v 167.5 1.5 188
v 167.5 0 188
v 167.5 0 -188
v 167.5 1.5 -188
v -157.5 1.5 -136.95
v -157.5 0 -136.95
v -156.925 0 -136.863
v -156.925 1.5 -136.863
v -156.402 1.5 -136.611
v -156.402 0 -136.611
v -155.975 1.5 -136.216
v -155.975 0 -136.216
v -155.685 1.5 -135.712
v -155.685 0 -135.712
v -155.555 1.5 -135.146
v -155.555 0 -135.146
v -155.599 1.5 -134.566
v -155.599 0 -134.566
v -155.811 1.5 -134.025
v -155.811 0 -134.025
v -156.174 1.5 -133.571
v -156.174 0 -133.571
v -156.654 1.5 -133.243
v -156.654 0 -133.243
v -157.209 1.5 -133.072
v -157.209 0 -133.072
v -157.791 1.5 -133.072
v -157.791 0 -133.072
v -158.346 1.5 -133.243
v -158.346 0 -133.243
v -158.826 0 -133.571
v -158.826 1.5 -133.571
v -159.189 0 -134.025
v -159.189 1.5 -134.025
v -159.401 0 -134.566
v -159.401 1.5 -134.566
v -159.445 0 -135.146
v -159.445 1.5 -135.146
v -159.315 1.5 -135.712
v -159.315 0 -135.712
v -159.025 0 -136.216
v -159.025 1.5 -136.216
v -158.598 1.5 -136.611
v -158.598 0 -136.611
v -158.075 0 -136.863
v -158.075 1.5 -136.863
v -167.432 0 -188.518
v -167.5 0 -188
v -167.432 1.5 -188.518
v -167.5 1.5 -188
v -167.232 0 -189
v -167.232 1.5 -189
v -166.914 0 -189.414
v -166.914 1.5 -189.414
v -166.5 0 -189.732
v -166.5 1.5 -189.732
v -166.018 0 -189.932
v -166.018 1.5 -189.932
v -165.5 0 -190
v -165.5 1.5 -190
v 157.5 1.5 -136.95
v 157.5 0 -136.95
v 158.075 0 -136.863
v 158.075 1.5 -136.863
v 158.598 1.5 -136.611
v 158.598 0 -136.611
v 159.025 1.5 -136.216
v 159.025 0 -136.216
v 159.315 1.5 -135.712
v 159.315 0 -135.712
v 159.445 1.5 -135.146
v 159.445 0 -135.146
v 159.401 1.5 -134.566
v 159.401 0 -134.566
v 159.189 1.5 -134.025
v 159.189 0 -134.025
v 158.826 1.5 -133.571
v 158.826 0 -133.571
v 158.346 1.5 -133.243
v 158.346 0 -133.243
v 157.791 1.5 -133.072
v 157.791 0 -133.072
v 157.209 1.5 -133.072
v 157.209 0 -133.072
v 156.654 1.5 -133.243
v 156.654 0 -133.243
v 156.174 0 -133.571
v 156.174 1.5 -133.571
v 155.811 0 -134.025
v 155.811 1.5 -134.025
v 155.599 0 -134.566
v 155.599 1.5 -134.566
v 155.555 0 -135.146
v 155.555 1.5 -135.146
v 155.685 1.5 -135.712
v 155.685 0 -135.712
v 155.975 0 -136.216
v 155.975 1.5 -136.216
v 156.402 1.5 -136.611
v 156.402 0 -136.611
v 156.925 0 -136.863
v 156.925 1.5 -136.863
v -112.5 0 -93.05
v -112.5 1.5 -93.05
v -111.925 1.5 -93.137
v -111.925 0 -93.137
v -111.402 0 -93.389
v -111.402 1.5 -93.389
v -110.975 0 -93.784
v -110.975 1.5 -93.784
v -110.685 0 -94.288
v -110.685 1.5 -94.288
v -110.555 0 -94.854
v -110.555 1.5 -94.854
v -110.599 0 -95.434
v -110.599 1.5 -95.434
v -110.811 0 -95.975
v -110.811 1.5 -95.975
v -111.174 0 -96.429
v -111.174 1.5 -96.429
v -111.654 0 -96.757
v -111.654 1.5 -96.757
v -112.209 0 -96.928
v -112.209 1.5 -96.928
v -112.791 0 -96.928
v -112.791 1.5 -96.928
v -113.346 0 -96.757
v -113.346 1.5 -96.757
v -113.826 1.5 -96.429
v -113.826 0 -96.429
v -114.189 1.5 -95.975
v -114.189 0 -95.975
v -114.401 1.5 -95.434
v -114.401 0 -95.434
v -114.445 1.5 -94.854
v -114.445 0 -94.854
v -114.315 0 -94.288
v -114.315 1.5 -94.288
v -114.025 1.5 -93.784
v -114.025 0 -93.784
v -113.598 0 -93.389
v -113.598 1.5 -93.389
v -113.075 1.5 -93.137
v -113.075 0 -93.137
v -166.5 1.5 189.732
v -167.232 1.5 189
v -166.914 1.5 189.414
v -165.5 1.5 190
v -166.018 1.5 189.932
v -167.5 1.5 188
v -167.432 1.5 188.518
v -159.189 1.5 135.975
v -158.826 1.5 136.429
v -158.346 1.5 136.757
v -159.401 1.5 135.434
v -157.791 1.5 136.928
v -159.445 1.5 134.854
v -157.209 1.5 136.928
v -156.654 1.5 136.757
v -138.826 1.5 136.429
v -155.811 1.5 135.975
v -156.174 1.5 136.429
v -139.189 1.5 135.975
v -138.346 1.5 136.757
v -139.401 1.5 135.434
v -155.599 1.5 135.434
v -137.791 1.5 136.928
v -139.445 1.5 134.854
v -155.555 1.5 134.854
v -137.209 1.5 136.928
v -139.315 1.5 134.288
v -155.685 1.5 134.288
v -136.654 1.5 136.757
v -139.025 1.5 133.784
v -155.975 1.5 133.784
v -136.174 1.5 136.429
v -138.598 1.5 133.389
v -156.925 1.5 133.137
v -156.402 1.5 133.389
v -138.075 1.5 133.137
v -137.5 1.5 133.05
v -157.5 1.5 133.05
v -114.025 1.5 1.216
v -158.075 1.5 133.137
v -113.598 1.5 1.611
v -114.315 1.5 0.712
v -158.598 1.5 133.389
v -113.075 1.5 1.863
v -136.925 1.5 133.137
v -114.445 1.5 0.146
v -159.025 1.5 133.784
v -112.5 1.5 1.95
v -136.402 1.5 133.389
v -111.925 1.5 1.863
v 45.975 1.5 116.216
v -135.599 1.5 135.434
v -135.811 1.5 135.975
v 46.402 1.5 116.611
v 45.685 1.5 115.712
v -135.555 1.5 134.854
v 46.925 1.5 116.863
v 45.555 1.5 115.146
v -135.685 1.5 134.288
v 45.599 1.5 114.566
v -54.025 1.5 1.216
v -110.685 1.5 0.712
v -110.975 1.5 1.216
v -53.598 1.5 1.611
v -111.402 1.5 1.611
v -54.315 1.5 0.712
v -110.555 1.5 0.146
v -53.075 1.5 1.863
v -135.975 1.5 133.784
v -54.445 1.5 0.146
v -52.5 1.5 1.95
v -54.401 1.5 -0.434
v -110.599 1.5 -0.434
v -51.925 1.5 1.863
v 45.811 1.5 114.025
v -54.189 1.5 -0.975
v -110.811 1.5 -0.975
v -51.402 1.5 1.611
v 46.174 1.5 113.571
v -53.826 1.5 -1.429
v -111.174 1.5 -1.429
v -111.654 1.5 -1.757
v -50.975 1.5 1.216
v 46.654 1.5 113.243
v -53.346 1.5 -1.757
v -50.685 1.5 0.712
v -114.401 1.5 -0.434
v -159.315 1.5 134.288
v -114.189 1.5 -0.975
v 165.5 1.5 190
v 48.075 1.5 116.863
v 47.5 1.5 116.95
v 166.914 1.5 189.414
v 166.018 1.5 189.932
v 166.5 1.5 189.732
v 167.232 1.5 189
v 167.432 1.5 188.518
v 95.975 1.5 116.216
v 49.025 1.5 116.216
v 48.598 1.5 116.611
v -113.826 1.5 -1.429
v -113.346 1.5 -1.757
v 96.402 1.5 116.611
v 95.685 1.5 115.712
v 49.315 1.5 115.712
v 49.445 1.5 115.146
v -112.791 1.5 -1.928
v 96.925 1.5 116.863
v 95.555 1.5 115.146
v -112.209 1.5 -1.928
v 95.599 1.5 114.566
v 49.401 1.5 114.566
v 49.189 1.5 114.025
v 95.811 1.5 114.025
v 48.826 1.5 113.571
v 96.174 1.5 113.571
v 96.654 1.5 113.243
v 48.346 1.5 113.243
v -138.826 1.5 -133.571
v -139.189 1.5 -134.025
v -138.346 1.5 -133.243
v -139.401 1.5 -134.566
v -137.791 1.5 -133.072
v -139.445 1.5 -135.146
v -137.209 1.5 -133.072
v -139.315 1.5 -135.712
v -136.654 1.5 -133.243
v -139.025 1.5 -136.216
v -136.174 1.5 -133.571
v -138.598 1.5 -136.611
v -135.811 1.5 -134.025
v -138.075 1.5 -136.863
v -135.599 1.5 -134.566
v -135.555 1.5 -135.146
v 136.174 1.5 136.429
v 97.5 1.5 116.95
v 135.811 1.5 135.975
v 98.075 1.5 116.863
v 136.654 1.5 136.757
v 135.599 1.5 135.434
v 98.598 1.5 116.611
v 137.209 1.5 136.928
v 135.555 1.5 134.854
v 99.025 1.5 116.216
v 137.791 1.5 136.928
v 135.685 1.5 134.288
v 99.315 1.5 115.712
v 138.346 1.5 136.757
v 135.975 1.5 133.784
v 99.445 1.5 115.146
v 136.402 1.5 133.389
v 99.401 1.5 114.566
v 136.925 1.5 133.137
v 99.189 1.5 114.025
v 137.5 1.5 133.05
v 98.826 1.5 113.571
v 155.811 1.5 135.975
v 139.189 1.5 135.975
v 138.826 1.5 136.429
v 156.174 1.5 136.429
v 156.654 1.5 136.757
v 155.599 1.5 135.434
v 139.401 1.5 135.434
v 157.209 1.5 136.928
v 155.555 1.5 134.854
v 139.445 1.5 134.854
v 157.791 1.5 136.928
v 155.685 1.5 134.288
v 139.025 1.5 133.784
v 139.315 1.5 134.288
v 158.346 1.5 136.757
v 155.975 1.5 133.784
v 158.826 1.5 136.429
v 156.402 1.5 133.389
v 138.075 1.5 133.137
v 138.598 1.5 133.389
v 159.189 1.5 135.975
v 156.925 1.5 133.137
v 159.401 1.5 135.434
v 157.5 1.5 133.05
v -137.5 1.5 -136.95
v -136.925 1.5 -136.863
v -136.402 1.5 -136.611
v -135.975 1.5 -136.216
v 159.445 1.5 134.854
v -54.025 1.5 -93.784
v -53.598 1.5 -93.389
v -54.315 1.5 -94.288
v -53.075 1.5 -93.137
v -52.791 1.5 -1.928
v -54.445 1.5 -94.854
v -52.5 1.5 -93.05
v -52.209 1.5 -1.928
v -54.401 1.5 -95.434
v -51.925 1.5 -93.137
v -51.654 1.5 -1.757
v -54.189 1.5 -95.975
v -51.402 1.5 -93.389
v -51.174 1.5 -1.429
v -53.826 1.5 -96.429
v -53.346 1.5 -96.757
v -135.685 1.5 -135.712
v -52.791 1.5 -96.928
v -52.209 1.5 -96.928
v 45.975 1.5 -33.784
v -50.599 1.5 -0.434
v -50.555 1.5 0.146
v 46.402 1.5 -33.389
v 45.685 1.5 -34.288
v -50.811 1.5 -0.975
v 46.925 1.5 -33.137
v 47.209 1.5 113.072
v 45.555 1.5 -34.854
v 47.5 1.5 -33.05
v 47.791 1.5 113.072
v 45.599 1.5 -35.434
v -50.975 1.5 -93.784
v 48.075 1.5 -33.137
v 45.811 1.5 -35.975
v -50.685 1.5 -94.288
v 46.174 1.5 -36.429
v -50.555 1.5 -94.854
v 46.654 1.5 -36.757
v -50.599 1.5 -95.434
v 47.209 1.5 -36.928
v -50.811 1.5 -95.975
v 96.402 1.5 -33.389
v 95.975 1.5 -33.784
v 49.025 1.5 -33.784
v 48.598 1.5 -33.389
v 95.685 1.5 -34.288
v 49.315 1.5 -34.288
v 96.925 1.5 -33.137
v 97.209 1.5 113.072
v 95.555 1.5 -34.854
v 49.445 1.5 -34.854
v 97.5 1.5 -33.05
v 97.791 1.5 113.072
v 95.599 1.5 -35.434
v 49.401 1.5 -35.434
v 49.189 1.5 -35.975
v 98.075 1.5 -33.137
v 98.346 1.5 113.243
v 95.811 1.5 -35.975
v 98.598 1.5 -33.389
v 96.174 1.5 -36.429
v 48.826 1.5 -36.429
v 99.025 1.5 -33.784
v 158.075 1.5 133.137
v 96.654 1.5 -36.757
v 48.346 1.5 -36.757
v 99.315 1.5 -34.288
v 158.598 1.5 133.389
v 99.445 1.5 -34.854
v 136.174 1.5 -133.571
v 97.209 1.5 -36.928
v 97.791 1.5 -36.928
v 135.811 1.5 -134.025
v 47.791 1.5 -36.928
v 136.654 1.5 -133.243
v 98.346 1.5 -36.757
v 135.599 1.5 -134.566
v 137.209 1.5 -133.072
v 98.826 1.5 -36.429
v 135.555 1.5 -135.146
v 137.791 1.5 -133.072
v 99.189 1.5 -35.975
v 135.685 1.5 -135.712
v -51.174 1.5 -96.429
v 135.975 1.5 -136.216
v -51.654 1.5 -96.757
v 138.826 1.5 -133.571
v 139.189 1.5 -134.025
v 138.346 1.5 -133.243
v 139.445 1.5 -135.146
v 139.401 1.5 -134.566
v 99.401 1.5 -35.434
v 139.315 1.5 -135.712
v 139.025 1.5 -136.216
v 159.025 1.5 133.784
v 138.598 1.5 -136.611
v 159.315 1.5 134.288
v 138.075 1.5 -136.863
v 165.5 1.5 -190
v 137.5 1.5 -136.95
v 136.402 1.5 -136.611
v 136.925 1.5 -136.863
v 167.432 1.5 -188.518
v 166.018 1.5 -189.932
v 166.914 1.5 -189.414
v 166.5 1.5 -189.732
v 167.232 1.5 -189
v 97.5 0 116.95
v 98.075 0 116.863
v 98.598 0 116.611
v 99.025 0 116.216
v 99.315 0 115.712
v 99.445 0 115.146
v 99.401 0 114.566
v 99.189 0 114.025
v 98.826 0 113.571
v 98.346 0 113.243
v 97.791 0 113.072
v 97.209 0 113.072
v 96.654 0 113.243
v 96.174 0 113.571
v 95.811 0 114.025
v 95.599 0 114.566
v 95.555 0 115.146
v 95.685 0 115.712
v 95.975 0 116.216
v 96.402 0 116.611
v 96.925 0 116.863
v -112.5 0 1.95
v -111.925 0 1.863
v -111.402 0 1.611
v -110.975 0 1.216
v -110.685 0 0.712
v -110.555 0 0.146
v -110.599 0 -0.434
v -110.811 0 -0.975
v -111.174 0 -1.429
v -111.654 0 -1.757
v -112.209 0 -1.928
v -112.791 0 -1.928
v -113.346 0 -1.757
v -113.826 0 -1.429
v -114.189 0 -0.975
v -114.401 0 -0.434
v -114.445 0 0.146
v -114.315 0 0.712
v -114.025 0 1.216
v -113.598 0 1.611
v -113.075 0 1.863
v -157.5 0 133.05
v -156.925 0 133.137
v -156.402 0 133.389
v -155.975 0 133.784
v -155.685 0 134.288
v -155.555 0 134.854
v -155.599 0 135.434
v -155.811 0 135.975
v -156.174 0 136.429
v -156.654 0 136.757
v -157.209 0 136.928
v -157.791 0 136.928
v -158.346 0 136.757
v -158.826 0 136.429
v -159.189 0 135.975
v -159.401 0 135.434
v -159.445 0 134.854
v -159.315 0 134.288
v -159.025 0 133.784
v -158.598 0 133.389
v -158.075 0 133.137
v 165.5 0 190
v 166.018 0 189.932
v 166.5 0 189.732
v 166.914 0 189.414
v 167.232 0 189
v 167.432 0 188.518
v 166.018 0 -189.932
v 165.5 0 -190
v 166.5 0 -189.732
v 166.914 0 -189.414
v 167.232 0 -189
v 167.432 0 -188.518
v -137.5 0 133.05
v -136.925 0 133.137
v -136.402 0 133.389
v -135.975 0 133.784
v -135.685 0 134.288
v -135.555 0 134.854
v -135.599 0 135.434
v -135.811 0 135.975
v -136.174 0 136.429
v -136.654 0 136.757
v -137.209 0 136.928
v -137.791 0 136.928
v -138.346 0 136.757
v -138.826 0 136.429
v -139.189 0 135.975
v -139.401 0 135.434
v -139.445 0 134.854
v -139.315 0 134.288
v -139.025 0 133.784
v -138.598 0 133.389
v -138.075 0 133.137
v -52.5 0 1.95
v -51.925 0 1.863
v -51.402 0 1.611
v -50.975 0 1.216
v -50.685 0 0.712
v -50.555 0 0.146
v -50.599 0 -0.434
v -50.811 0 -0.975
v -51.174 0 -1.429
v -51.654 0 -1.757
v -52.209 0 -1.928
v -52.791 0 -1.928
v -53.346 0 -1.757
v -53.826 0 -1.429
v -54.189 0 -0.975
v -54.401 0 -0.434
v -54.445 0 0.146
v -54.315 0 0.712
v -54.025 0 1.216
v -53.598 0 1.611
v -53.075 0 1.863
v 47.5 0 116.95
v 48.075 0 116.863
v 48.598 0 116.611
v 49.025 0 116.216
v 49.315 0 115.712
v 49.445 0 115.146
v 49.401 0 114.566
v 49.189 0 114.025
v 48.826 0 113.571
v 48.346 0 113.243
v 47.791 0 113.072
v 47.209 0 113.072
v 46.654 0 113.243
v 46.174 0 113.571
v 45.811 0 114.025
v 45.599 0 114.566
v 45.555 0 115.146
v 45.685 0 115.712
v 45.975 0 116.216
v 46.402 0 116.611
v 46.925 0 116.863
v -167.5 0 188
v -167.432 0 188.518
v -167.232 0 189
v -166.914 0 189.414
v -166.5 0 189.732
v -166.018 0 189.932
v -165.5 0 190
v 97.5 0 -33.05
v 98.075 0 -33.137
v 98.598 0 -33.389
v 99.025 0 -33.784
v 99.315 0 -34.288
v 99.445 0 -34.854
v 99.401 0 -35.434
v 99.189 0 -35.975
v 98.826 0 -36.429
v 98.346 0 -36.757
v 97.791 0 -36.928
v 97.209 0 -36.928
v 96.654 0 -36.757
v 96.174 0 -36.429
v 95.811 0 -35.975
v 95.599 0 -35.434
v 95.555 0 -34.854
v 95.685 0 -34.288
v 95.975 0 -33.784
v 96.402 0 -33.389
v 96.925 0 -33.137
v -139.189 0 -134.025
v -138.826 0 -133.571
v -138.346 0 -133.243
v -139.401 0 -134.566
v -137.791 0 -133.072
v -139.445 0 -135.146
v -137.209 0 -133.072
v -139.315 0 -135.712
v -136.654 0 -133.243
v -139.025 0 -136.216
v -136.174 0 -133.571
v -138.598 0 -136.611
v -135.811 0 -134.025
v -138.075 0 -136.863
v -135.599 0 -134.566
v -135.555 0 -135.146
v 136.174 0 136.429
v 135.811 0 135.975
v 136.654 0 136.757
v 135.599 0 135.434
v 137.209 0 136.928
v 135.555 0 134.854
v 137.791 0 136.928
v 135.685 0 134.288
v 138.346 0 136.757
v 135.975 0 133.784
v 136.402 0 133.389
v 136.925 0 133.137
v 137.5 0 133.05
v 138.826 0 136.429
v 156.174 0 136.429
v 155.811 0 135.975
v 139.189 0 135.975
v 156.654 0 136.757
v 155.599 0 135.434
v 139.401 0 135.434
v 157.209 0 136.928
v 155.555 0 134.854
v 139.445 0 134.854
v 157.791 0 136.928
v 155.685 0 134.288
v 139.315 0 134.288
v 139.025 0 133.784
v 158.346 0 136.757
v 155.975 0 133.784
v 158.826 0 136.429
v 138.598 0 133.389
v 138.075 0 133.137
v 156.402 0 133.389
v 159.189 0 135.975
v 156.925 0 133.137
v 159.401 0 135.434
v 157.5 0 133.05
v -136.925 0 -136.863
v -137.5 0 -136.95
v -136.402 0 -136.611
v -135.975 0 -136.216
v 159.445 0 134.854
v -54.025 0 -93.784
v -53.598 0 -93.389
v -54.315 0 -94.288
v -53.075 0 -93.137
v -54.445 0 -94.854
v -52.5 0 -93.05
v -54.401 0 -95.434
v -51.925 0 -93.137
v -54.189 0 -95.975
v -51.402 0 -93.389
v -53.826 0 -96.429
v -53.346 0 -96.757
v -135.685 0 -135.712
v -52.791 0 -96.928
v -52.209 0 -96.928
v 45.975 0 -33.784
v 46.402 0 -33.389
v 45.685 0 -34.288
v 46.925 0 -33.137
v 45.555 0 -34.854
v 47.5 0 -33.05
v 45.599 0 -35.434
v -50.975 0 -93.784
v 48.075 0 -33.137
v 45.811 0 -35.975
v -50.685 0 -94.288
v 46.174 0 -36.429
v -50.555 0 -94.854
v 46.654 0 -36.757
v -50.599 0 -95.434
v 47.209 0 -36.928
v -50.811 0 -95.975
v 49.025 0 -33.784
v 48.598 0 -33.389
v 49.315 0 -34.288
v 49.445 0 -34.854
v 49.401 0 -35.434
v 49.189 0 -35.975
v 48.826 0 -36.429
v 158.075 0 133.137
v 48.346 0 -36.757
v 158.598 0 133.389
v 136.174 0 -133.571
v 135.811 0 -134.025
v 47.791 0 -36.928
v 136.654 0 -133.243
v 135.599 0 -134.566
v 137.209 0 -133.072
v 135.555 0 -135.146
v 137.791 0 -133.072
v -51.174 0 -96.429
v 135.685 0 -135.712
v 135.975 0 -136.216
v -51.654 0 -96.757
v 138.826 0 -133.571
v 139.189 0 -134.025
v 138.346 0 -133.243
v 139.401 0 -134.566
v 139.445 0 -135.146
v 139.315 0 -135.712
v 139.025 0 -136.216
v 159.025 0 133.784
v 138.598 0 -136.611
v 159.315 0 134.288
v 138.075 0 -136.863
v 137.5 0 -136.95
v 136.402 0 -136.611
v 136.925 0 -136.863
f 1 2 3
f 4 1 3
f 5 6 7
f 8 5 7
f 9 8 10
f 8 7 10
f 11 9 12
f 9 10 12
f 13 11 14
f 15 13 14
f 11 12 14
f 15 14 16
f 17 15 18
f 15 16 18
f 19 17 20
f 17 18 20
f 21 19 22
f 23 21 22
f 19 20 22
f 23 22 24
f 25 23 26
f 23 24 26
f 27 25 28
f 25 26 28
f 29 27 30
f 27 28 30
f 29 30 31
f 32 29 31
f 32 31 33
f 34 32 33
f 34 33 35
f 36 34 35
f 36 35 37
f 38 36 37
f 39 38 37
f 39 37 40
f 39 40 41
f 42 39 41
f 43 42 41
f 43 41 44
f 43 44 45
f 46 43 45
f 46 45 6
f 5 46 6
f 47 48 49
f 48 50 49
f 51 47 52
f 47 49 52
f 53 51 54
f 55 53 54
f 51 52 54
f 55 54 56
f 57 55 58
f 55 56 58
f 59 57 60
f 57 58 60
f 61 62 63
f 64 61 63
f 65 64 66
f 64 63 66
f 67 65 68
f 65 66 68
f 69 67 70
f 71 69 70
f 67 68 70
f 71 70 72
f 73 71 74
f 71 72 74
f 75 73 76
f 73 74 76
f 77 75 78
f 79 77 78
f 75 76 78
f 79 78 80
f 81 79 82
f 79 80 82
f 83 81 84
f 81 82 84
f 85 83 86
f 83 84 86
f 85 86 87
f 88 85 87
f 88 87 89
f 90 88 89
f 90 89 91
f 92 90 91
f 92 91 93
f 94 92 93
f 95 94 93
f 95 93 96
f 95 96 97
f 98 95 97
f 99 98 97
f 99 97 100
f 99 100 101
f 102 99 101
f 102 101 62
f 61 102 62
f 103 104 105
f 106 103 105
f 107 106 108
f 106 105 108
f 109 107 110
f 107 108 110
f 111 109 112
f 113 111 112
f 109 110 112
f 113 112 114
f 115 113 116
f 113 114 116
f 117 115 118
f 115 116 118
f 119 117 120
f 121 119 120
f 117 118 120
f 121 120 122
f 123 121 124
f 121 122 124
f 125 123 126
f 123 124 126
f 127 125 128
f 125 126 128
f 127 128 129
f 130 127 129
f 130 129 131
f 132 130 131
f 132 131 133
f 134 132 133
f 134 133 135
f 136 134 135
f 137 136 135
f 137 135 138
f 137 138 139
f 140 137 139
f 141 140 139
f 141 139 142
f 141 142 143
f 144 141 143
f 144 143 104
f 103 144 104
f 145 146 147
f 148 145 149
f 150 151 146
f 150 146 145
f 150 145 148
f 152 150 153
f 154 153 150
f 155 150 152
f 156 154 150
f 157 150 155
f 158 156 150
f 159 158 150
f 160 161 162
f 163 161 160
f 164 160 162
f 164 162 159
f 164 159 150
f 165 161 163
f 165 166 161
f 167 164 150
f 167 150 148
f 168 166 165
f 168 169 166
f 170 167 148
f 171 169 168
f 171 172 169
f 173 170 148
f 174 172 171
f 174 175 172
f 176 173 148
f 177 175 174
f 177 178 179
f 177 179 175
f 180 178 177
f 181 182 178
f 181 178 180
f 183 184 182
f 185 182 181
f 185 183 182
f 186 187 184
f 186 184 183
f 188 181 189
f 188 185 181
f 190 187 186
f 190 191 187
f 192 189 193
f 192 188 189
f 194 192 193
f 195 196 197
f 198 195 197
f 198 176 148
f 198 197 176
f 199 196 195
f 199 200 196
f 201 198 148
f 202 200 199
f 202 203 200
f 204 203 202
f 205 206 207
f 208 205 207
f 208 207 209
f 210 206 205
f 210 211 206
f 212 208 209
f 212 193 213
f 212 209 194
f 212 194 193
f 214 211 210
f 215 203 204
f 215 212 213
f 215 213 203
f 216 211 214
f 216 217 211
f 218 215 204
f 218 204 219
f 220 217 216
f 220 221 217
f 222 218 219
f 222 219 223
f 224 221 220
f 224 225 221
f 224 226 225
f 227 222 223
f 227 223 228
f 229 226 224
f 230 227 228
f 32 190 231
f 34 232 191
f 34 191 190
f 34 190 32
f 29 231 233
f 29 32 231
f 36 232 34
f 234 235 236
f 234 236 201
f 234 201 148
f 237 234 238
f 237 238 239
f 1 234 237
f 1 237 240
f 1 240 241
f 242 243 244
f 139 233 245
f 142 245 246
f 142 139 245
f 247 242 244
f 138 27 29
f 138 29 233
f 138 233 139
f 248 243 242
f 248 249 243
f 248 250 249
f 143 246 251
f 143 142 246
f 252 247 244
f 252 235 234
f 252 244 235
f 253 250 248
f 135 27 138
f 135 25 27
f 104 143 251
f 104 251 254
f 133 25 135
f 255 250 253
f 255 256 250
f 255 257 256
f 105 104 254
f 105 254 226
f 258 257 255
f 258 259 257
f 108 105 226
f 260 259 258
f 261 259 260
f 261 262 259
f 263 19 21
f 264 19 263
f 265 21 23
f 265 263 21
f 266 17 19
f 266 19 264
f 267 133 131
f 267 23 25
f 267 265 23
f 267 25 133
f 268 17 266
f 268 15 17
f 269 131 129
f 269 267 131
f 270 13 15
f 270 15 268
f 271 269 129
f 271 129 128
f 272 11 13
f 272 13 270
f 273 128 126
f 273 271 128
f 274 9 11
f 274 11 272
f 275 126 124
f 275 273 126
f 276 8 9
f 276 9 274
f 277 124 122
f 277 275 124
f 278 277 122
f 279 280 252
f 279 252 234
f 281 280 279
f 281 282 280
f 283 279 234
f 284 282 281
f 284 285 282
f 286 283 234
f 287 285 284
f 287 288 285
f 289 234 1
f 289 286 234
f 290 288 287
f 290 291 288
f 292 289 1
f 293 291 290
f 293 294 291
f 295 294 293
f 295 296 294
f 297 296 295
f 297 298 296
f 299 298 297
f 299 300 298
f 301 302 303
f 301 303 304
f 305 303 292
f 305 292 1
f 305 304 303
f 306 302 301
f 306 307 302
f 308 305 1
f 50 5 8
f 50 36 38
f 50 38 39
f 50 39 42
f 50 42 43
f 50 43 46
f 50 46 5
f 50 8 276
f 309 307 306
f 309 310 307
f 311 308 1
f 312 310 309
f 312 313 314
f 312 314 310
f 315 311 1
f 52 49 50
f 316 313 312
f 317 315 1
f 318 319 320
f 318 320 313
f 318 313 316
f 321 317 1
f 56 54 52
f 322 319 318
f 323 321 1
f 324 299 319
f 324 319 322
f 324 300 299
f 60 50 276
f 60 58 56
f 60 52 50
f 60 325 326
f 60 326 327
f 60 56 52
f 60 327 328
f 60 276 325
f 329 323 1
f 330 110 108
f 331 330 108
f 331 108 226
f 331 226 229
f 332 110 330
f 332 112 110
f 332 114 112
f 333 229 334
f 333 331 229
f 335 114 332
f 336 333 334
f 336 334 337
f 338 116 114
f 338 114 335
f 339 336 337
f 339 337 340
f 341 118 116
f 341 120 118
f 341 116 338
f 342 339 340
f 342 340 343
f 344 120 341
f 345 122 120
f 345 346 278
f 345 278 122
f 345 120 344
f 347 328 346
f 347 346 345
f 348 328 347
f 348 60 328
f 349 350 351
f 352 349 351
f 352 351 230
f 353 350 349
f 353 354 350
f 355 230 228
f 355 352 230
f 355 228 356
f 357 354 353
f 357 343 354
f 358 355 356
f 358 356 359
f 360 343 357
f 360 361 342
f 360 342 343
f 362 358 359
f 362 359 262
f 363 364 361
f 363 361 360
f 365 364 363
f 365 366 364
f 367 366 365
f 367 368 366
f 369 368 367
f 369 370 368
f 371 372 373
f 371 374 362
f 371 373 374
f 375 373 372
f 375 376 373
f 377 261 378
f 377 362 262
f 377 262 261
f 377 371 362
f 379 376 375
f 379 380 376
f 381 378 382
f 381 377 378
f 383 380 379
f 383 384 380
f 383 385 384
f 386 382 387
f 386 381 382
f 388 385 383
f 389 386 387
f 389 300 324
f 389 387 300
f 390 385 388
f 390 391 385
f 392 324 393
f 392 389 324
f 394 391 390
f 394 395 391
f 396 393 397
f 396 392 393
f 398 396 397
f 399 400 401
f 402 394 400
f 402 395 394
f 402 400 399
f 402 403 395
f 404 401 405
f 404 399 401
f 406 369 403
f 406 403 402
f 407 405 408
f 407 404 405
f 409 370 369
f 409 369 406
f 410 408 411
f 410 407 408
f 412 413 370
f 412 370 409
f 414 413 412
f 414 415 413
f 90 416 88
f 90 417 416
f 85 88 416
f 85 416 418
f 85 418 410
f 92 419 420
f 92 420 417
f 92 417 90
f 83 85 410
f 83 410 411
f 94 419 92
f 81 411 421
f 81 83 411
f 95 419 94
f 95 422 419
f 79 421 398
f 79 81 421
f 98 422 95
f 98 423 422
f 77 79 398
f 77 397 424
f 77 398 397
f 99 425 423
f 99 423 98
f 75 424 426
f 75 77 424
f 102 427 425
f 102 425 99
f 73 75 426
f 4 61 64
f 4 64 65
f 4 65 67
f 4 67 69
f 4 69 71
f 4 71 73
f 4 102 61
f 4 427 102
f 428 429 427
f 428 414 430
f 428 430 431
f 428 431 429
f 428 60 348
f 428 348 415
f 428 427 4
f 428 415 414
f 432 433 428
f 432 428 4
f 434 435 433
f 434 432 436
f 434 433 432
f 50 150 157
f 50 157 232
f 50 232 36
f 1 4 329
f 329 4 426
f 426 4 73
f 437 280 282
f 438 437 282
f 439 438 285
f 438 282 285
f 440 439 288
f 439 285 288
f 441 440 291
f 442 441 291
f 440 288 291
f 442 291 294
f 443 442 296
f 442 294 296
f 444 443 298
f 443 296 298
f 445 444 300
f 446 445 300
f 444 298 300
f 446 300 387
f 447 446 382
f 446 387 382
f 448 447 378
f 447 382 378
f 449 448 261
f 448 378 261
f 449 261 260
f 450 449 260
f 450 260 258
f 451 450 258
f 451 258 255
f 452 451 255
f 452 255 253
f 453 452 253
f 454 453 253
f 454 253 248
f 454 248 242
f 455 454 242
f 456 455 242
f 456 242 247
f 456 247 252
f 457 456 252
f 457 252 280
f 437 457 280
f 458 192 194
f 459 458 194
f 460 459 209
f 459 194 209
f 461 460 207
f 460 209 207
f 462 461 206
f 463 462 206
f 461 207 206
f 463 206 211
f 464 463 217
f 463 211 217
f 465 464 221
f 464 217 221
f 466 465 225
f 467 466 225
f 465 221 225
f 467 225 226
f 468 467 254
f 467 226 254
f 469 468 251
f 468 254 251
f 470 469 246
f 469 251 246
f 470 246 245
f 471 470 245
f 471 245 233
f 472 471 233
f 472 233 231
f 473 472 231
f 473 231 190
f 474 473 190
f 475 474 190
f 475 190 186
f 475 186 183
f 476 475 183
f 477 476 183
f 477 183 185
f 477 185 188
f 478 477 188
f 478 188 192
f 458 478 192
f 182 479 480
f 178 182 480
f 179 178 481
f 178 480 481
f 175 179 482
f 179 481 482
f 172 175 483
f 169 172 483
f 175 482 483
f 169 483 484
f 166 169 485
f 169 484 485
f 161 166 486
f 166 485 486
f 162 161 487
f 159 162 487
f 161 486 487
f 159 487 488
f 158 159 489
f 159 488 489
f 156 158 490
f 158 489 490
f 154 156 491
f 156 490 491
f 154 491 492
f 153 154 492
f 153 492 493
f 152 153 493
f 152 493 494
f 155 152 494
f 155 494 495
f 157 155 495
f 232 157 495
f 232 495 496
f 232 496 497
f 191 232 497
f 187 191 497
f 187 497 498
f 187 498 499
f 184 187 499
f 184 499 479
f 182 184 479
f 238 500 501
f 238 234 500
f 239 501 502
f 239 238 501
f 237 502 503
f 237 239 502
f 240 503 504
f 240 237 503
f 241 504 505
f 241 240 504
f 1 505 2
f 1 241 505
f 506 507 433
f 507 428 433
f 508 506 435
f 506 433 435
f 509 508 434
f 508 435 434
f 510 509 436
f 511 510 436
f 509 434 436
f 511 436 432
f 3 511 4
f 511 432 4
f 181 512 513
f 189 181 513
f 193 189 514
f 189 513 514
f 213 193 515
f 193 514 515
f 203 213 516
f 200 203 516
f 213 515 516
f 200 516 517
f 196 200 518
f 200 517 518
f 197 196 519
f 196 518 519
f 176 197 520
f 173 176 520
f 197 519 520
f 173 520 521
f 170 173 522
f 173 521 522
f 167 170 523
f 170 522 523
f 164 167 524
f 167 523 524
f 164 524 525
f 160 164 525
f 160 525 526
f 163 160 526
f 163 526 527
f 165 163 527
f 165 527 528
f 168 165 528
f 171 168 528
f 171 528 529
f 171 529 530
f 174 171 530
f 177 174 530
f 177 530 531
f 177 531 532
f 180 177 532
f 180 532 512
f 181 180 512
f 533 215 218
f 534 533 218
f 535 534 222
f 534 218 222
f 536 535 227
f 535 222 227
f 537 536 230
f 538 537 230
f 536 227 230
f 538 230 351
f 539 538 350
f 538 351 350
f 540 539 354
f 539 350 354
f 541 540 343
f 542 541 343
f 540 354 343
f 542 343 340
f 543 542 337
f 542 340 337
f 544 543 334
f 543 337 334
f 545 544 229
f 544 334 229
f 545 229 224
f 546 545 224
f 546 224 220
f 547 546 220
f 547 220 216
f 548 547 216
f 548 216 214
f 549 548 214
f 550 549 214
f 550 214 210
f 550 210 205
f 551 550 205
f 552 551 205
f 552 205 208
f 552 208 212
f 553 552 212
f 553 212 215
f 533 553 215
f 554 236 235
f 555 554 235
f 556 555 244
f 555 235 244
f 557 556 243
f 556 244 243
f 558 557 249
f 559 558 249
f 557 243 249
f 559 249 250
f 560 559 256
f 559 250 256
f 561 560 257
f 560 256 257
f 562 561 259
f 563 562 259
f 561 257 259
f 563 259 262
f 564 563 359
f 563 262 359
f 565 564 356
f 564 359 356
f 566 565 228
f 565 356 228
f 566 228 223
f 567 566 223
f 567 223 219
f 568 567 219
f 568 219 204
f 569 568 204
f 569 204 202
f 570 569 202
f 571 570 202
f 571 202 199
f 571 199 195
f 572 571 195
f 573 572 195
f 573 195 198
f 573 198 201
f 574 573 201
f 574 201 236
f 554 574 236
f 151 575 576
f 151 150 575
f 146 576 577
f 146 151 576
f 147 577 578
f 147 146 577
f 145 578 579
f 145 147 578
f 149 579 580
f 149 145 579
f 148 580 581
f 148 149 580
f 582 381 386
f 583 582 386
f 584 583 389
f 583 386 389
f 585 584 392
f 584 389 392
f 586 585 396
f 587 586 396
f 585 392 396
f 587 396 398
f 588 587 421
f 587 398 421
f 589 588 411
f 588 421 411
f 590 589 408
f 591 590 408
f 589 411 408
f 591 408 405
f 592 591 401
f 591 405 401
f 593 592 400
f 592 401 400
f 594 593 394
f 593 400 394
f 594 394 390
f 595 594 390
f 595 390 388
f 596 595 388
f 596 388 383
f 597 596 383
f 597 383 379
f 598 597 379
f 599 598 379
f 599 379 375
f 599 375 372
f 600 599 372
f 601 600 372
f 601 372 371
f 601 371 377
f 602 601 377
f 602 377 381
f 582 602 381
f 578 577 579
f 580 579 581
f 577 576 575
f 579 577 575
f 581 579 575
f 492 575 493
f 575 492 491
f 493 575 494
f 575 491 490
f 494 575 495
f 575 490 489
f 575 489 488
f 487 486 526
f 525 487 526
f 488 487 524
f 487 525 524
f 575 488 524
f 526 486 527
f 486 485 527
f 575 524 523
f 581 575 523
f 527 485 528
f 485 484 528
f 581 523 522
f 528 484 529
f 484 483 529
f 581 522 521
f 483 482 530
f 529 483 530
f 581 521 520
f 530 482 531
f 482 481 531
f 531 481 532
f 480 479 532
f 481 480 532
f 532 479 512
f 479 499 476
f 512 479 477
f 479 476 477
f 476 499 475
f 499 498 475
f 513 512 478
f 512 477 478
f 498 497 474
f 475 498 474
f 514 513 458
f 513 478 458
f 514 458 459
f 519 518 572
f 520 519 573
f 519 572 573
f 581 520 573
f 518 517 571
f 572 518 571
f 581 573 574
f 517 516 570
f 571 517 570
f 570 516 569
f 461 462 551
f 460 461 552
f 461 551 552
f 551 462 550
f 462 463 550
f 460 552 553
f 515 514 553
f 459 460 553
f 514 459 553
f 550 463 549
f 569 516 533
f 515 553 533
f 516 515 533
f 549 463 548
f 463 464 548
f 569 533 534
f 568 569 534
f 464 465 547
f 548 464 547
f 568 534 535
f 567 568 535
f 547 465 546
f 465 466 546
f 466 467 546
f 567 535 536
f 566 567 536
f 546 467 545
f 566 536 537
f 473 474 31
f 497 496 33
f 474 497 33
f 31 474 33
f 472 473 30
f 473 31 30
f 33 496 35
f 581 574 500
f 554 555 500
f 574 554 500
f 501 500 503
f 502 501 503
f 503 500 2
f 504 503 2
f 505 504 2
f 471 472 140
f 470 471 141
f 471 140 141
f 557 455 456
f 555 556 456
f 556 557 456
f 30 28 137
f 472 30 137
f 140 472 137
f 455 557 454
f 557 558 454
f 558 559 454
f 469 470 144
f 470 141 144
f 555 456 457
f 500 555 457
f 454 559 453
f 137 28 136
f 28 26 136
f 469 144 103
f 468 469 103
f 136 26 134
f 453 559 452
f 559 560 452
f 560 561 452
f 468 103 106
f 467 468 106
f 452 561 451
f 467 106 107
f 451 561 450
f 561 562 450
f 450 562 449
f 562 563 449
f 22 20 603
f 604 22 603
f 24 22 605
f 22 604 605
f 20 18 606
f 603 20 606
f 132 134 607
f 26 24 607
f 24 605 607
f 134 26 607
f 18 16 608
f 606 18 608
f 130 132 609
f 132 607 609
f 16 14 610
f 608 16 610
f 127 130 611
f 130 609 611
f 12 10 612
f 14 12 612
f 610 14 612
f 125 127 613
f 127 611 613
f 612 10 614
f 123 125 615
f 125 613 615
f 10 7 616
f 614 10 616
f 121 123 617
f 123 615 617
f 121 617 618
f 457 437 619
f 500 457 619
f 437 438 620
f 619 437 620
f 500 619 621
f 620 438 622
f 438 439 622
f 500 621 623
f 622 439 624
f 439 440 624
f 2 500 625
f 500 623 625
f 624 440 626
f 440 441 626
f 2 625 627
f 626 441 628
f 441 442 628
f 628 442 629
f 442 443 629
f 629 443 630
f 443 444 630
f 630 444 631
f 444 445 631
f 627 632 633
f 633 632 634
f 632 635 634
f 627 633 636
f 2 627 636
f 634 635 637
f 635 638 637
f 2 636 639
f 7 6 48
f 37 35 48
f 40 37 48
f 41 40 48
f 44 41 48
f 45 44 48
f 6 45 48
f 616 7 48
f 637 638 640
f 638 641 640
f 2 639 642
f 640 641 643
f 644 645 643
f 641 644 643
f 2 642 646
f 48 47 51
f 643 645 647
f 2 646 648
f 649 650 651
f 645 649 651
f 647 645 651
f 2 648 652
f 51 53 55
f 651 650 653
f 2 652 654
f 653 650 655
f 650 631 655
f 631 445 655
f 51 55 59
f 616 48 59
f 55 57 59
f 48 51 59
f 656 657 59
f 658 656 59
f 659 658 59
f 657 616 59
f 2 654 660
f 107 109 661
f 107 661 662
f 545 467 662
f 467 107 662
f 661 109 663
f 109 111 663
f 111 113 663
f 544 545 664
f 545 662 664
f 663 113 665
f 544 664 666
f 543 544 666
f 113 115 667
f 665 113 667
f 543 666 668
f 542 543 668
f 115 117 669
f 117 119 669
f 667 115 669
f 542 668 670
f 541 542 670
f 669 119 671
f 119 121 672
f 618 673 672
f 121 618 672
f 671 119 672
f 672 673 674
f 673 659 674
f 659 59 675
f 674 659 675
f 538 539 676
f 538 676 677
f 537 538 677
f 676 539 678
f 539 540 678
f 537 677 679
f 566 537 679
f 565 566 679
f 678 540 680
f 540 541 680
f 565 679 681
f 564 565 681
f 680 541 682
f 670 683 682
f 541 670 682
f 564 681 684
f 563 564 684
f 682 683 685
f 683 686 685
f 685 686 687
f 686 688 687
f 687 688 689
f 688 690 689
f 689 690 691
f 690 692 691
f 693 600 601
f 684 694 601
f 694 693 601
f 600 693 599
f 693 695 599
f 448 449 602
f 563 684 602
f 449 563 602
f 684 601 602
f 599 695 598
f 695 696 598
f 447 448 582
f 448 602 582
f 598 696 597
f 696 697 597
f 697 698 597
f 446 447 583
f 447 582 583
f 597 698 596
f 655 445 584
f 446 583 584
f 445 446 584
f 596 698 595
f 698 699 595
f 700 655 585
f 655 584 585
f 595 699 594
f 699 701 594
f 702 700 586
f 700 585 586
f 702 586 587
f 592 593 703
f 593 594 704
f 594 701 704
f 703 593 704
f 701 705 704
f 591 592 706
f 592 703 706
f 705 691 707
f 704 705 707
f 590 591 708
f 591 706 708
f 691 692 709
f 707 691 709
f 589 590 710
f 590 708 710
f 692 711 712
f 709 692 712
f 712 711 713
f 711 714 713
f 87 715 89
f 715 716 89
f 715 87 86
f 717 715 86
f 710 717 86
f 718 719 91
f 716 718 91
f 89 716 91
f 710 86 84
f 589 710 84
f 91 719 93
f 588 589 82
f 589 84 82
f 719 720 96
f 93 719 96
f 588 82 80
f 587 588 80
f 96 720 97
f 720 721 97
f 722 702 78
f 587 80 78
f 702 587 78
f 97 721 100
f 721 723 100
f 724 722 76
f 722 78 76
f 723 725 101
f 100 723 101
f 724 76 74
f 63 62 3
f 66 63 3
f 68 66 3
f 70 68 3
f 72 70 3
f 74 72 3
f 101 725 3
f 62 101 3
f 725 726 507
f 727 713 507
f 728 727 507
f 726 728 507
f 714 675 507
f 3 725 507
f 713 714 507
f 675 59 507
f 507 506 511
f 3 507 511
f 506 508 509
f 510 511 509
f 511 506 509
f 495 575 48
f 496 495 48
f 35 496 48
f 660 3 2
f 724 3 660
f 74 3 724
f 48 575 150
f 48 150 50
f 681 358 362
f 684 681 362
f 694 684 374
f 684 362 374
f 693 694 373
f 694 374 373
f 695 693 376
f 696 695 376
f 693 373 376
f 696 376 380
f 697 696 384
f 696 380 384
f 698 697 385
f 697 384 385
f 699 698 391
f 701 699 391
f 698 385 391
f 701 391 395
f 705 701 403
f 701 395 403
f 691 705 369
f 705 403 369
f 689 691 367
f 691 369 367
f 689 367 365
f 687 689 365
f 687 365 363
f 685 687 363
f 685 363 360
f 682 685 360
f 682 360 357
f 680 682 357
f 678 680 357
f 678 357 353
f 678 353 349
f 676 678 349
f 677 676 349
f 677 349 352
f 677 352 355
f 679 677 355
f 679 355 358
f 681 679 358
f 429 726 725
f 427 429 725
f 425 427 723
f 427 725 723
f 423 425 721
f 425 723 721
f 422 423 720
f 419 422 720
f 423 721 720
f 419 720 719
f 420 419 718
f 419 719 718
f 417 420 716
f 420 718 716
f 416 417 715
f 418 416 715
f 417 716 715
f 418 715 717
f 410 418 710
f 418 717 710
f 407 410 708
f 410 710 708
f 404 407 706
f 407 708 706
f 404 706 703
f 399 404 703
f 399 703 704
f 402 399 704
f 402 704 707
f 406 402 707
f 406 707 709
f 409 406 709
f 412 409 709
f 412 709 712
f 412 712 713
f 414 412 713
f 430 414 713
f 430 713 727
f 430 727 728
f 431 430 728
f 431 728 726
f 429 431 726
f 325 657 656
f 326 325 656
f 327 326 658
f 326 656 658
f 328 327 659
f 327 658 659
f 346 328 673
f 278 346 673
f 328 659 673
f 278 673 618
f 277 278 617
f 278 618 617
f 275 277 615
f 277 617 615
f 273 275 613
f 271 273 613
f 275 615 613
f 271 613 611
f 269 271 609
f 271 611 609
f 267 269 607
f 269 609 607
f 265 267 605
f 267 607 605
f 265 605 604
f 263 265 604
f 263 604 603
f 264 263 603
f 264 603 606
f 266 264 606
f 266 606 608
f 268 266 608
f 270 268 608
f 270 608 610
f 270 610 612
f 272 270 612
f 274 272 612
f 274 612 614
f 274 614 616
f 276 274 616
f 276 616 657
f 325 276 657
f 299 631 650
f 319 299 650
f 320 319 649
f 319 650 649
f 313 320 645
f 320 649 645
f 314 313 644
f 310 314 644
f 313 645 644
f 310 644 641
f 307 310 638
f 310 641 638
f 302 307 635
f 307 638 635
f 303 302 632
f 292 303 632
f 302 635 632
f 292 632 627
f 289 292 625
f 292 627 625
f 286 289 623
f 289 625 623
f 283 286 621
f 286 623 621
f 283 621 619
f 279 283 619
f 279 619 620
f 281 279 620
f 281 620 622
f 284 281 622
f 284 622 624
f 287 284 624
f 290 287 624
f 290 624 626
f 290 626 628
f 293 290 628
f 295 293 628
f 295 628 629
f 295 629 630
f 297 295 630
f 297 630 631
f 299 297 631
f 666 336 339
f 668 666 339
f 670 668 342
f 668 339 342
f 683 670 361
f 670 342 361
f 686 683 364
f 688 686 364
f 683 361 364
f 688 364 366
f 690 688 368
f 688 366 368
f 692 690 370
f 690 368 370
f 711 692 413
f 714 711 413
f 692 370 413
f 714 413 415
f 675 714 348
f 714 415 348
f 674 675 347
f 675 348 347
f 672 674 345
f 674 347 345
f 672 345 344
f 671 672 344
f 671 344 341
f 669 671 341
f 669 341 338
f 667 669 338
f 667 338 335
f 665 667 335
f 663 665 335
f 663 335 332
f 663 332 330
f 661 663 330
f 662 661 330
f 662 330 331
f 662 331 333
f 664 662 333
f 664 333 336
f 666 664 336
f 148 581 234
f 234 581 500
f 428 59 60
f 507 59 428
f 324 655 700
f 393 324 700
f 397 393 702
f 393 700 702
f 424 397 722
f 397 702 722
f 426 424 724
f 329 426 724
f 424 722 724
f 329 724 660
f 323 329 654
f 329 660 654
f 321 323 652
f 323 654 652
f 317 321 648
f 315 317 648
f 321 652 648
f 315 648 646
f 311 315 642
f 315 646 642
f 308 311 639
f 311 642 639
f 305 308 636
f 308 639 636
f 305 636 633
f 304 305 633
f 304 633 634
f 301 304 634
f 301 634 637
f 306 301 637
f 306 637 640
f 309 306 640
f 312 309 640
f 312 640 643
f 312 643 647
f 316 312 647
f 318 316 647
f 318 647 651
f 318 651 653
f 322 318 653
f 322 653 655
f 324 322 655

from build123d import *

# Parameters (mm, degrees)
SKETCH1_W           = 335
SKETCH1_H           = 380
BOSS_EXTRUDE1_DEPTH = 1.5
SKETCH12_R          = 1.95
CUT_EXTRUDE3_DEPTH  = 50.8
SKETCH6_R           = 1.95
CUT_EXTRUDE4_DEPTH  = 50.8
SKETCH7_R           = 1.95
CUT_EXTRUDE5_DEPTH  = 50.8
FILLET1_R           = 2


with BuildPart() as part:
    # Sketch1 → Boss-Extrude1 (new body)
    with BuildSketch(Plane(origin=(0, 0, 0), x_dir=(1, 0, 0), z_dir=(0, 1, 0))):
        Rectangle(SKETCH1_W, SKETCH1_H)
    extrude(amount=BOSS_EXTRUDE1_DEPTH)

    # Sketch12 → Cut-Extrude3 (cut)
    with BuildSketch(Plane(origin=(0, 0, 0), x_dir=(-1, 0, 0), z_dir=(0, -1, 0))):
        with Locations((-137.5, -135)):
            Circle(SKETCH12_R)
        with Locations((-157.5, 135)):
            Circle(SKETCH12_R)
        with Locations((-157.5, -135)):
            Circle(SKETCH12_R)
        with Locations((-137.5, 135)):
            Circle(SKETCH12_R)
        with Locations((157.5, -135)):
            Circle(SKETCH12_R)
        with Locations((137.5, 135)):
            Circle(SKETCH12_R)
        with Locations((157.5, 135)):
            Circle(SKETCH12_R)
        with Locations((137.5, -135)):
            Circle(SKETCH12_R)
    extrude(amount=-CUT_EXTRUDE3_DEPTH, mode=Mode.SUBTRACT)

    # Sketch6 → Cut-Extrude4 (cut)
    with BuildSketch(Plane(origin=(0, 1.5, 0), x_dir=(1, 0, 0), z_dir=(0, 1, 0))):
        with Locations((97.5, 35)):
            Circle(SKETCH6_R)
        with Locations((47.5, 35)):
            Circle(SKETCH6_R)
        with Locations((97.5, -115)):
            Circle(SKETCH6_R)
        with Locations((47.5, -115)):
            Circle(SKETCH6_R)
    extrude(amount=-CUT_EXTRUDE4_DEPTH, mode=Mode.SUBTRACT)

    # Sketch7 → Cut-Extrude5 (cut)
    with BuildSketch(Plane(origin=(0, 1.5, 0), x_dir=(1, 0, 0), z_dir=(0, 1, 0))):
        with Locations((-112.5, 95)):
            Circle(SKETCH7_R)
        with Locations((-52.5, 95)):
            Circle(SKETCH7_R)
        with Locations((-52.5, 0)):
            Circle(SKETCH7_R)
        with Locations((-112.5, 0)):
            Circle(SKETCH7_R)
    extrude(amount=-CUT_EXTRUDE5_DEPTH, mode=Mode.SUBTRACT)

    # Fillet1
    fillet1_edges = [part.edges().sort_by_distance(p)[0] for p in [
        (167.5, 0.75, -190),
        (167.5, 0.75, 190),
        (-167.5, 0.75, 190),
        (-167.5, 0.75, -190),
    ]]
    fillet(fillet1_edges, radius=FILLET1_R)


solid = part.part
